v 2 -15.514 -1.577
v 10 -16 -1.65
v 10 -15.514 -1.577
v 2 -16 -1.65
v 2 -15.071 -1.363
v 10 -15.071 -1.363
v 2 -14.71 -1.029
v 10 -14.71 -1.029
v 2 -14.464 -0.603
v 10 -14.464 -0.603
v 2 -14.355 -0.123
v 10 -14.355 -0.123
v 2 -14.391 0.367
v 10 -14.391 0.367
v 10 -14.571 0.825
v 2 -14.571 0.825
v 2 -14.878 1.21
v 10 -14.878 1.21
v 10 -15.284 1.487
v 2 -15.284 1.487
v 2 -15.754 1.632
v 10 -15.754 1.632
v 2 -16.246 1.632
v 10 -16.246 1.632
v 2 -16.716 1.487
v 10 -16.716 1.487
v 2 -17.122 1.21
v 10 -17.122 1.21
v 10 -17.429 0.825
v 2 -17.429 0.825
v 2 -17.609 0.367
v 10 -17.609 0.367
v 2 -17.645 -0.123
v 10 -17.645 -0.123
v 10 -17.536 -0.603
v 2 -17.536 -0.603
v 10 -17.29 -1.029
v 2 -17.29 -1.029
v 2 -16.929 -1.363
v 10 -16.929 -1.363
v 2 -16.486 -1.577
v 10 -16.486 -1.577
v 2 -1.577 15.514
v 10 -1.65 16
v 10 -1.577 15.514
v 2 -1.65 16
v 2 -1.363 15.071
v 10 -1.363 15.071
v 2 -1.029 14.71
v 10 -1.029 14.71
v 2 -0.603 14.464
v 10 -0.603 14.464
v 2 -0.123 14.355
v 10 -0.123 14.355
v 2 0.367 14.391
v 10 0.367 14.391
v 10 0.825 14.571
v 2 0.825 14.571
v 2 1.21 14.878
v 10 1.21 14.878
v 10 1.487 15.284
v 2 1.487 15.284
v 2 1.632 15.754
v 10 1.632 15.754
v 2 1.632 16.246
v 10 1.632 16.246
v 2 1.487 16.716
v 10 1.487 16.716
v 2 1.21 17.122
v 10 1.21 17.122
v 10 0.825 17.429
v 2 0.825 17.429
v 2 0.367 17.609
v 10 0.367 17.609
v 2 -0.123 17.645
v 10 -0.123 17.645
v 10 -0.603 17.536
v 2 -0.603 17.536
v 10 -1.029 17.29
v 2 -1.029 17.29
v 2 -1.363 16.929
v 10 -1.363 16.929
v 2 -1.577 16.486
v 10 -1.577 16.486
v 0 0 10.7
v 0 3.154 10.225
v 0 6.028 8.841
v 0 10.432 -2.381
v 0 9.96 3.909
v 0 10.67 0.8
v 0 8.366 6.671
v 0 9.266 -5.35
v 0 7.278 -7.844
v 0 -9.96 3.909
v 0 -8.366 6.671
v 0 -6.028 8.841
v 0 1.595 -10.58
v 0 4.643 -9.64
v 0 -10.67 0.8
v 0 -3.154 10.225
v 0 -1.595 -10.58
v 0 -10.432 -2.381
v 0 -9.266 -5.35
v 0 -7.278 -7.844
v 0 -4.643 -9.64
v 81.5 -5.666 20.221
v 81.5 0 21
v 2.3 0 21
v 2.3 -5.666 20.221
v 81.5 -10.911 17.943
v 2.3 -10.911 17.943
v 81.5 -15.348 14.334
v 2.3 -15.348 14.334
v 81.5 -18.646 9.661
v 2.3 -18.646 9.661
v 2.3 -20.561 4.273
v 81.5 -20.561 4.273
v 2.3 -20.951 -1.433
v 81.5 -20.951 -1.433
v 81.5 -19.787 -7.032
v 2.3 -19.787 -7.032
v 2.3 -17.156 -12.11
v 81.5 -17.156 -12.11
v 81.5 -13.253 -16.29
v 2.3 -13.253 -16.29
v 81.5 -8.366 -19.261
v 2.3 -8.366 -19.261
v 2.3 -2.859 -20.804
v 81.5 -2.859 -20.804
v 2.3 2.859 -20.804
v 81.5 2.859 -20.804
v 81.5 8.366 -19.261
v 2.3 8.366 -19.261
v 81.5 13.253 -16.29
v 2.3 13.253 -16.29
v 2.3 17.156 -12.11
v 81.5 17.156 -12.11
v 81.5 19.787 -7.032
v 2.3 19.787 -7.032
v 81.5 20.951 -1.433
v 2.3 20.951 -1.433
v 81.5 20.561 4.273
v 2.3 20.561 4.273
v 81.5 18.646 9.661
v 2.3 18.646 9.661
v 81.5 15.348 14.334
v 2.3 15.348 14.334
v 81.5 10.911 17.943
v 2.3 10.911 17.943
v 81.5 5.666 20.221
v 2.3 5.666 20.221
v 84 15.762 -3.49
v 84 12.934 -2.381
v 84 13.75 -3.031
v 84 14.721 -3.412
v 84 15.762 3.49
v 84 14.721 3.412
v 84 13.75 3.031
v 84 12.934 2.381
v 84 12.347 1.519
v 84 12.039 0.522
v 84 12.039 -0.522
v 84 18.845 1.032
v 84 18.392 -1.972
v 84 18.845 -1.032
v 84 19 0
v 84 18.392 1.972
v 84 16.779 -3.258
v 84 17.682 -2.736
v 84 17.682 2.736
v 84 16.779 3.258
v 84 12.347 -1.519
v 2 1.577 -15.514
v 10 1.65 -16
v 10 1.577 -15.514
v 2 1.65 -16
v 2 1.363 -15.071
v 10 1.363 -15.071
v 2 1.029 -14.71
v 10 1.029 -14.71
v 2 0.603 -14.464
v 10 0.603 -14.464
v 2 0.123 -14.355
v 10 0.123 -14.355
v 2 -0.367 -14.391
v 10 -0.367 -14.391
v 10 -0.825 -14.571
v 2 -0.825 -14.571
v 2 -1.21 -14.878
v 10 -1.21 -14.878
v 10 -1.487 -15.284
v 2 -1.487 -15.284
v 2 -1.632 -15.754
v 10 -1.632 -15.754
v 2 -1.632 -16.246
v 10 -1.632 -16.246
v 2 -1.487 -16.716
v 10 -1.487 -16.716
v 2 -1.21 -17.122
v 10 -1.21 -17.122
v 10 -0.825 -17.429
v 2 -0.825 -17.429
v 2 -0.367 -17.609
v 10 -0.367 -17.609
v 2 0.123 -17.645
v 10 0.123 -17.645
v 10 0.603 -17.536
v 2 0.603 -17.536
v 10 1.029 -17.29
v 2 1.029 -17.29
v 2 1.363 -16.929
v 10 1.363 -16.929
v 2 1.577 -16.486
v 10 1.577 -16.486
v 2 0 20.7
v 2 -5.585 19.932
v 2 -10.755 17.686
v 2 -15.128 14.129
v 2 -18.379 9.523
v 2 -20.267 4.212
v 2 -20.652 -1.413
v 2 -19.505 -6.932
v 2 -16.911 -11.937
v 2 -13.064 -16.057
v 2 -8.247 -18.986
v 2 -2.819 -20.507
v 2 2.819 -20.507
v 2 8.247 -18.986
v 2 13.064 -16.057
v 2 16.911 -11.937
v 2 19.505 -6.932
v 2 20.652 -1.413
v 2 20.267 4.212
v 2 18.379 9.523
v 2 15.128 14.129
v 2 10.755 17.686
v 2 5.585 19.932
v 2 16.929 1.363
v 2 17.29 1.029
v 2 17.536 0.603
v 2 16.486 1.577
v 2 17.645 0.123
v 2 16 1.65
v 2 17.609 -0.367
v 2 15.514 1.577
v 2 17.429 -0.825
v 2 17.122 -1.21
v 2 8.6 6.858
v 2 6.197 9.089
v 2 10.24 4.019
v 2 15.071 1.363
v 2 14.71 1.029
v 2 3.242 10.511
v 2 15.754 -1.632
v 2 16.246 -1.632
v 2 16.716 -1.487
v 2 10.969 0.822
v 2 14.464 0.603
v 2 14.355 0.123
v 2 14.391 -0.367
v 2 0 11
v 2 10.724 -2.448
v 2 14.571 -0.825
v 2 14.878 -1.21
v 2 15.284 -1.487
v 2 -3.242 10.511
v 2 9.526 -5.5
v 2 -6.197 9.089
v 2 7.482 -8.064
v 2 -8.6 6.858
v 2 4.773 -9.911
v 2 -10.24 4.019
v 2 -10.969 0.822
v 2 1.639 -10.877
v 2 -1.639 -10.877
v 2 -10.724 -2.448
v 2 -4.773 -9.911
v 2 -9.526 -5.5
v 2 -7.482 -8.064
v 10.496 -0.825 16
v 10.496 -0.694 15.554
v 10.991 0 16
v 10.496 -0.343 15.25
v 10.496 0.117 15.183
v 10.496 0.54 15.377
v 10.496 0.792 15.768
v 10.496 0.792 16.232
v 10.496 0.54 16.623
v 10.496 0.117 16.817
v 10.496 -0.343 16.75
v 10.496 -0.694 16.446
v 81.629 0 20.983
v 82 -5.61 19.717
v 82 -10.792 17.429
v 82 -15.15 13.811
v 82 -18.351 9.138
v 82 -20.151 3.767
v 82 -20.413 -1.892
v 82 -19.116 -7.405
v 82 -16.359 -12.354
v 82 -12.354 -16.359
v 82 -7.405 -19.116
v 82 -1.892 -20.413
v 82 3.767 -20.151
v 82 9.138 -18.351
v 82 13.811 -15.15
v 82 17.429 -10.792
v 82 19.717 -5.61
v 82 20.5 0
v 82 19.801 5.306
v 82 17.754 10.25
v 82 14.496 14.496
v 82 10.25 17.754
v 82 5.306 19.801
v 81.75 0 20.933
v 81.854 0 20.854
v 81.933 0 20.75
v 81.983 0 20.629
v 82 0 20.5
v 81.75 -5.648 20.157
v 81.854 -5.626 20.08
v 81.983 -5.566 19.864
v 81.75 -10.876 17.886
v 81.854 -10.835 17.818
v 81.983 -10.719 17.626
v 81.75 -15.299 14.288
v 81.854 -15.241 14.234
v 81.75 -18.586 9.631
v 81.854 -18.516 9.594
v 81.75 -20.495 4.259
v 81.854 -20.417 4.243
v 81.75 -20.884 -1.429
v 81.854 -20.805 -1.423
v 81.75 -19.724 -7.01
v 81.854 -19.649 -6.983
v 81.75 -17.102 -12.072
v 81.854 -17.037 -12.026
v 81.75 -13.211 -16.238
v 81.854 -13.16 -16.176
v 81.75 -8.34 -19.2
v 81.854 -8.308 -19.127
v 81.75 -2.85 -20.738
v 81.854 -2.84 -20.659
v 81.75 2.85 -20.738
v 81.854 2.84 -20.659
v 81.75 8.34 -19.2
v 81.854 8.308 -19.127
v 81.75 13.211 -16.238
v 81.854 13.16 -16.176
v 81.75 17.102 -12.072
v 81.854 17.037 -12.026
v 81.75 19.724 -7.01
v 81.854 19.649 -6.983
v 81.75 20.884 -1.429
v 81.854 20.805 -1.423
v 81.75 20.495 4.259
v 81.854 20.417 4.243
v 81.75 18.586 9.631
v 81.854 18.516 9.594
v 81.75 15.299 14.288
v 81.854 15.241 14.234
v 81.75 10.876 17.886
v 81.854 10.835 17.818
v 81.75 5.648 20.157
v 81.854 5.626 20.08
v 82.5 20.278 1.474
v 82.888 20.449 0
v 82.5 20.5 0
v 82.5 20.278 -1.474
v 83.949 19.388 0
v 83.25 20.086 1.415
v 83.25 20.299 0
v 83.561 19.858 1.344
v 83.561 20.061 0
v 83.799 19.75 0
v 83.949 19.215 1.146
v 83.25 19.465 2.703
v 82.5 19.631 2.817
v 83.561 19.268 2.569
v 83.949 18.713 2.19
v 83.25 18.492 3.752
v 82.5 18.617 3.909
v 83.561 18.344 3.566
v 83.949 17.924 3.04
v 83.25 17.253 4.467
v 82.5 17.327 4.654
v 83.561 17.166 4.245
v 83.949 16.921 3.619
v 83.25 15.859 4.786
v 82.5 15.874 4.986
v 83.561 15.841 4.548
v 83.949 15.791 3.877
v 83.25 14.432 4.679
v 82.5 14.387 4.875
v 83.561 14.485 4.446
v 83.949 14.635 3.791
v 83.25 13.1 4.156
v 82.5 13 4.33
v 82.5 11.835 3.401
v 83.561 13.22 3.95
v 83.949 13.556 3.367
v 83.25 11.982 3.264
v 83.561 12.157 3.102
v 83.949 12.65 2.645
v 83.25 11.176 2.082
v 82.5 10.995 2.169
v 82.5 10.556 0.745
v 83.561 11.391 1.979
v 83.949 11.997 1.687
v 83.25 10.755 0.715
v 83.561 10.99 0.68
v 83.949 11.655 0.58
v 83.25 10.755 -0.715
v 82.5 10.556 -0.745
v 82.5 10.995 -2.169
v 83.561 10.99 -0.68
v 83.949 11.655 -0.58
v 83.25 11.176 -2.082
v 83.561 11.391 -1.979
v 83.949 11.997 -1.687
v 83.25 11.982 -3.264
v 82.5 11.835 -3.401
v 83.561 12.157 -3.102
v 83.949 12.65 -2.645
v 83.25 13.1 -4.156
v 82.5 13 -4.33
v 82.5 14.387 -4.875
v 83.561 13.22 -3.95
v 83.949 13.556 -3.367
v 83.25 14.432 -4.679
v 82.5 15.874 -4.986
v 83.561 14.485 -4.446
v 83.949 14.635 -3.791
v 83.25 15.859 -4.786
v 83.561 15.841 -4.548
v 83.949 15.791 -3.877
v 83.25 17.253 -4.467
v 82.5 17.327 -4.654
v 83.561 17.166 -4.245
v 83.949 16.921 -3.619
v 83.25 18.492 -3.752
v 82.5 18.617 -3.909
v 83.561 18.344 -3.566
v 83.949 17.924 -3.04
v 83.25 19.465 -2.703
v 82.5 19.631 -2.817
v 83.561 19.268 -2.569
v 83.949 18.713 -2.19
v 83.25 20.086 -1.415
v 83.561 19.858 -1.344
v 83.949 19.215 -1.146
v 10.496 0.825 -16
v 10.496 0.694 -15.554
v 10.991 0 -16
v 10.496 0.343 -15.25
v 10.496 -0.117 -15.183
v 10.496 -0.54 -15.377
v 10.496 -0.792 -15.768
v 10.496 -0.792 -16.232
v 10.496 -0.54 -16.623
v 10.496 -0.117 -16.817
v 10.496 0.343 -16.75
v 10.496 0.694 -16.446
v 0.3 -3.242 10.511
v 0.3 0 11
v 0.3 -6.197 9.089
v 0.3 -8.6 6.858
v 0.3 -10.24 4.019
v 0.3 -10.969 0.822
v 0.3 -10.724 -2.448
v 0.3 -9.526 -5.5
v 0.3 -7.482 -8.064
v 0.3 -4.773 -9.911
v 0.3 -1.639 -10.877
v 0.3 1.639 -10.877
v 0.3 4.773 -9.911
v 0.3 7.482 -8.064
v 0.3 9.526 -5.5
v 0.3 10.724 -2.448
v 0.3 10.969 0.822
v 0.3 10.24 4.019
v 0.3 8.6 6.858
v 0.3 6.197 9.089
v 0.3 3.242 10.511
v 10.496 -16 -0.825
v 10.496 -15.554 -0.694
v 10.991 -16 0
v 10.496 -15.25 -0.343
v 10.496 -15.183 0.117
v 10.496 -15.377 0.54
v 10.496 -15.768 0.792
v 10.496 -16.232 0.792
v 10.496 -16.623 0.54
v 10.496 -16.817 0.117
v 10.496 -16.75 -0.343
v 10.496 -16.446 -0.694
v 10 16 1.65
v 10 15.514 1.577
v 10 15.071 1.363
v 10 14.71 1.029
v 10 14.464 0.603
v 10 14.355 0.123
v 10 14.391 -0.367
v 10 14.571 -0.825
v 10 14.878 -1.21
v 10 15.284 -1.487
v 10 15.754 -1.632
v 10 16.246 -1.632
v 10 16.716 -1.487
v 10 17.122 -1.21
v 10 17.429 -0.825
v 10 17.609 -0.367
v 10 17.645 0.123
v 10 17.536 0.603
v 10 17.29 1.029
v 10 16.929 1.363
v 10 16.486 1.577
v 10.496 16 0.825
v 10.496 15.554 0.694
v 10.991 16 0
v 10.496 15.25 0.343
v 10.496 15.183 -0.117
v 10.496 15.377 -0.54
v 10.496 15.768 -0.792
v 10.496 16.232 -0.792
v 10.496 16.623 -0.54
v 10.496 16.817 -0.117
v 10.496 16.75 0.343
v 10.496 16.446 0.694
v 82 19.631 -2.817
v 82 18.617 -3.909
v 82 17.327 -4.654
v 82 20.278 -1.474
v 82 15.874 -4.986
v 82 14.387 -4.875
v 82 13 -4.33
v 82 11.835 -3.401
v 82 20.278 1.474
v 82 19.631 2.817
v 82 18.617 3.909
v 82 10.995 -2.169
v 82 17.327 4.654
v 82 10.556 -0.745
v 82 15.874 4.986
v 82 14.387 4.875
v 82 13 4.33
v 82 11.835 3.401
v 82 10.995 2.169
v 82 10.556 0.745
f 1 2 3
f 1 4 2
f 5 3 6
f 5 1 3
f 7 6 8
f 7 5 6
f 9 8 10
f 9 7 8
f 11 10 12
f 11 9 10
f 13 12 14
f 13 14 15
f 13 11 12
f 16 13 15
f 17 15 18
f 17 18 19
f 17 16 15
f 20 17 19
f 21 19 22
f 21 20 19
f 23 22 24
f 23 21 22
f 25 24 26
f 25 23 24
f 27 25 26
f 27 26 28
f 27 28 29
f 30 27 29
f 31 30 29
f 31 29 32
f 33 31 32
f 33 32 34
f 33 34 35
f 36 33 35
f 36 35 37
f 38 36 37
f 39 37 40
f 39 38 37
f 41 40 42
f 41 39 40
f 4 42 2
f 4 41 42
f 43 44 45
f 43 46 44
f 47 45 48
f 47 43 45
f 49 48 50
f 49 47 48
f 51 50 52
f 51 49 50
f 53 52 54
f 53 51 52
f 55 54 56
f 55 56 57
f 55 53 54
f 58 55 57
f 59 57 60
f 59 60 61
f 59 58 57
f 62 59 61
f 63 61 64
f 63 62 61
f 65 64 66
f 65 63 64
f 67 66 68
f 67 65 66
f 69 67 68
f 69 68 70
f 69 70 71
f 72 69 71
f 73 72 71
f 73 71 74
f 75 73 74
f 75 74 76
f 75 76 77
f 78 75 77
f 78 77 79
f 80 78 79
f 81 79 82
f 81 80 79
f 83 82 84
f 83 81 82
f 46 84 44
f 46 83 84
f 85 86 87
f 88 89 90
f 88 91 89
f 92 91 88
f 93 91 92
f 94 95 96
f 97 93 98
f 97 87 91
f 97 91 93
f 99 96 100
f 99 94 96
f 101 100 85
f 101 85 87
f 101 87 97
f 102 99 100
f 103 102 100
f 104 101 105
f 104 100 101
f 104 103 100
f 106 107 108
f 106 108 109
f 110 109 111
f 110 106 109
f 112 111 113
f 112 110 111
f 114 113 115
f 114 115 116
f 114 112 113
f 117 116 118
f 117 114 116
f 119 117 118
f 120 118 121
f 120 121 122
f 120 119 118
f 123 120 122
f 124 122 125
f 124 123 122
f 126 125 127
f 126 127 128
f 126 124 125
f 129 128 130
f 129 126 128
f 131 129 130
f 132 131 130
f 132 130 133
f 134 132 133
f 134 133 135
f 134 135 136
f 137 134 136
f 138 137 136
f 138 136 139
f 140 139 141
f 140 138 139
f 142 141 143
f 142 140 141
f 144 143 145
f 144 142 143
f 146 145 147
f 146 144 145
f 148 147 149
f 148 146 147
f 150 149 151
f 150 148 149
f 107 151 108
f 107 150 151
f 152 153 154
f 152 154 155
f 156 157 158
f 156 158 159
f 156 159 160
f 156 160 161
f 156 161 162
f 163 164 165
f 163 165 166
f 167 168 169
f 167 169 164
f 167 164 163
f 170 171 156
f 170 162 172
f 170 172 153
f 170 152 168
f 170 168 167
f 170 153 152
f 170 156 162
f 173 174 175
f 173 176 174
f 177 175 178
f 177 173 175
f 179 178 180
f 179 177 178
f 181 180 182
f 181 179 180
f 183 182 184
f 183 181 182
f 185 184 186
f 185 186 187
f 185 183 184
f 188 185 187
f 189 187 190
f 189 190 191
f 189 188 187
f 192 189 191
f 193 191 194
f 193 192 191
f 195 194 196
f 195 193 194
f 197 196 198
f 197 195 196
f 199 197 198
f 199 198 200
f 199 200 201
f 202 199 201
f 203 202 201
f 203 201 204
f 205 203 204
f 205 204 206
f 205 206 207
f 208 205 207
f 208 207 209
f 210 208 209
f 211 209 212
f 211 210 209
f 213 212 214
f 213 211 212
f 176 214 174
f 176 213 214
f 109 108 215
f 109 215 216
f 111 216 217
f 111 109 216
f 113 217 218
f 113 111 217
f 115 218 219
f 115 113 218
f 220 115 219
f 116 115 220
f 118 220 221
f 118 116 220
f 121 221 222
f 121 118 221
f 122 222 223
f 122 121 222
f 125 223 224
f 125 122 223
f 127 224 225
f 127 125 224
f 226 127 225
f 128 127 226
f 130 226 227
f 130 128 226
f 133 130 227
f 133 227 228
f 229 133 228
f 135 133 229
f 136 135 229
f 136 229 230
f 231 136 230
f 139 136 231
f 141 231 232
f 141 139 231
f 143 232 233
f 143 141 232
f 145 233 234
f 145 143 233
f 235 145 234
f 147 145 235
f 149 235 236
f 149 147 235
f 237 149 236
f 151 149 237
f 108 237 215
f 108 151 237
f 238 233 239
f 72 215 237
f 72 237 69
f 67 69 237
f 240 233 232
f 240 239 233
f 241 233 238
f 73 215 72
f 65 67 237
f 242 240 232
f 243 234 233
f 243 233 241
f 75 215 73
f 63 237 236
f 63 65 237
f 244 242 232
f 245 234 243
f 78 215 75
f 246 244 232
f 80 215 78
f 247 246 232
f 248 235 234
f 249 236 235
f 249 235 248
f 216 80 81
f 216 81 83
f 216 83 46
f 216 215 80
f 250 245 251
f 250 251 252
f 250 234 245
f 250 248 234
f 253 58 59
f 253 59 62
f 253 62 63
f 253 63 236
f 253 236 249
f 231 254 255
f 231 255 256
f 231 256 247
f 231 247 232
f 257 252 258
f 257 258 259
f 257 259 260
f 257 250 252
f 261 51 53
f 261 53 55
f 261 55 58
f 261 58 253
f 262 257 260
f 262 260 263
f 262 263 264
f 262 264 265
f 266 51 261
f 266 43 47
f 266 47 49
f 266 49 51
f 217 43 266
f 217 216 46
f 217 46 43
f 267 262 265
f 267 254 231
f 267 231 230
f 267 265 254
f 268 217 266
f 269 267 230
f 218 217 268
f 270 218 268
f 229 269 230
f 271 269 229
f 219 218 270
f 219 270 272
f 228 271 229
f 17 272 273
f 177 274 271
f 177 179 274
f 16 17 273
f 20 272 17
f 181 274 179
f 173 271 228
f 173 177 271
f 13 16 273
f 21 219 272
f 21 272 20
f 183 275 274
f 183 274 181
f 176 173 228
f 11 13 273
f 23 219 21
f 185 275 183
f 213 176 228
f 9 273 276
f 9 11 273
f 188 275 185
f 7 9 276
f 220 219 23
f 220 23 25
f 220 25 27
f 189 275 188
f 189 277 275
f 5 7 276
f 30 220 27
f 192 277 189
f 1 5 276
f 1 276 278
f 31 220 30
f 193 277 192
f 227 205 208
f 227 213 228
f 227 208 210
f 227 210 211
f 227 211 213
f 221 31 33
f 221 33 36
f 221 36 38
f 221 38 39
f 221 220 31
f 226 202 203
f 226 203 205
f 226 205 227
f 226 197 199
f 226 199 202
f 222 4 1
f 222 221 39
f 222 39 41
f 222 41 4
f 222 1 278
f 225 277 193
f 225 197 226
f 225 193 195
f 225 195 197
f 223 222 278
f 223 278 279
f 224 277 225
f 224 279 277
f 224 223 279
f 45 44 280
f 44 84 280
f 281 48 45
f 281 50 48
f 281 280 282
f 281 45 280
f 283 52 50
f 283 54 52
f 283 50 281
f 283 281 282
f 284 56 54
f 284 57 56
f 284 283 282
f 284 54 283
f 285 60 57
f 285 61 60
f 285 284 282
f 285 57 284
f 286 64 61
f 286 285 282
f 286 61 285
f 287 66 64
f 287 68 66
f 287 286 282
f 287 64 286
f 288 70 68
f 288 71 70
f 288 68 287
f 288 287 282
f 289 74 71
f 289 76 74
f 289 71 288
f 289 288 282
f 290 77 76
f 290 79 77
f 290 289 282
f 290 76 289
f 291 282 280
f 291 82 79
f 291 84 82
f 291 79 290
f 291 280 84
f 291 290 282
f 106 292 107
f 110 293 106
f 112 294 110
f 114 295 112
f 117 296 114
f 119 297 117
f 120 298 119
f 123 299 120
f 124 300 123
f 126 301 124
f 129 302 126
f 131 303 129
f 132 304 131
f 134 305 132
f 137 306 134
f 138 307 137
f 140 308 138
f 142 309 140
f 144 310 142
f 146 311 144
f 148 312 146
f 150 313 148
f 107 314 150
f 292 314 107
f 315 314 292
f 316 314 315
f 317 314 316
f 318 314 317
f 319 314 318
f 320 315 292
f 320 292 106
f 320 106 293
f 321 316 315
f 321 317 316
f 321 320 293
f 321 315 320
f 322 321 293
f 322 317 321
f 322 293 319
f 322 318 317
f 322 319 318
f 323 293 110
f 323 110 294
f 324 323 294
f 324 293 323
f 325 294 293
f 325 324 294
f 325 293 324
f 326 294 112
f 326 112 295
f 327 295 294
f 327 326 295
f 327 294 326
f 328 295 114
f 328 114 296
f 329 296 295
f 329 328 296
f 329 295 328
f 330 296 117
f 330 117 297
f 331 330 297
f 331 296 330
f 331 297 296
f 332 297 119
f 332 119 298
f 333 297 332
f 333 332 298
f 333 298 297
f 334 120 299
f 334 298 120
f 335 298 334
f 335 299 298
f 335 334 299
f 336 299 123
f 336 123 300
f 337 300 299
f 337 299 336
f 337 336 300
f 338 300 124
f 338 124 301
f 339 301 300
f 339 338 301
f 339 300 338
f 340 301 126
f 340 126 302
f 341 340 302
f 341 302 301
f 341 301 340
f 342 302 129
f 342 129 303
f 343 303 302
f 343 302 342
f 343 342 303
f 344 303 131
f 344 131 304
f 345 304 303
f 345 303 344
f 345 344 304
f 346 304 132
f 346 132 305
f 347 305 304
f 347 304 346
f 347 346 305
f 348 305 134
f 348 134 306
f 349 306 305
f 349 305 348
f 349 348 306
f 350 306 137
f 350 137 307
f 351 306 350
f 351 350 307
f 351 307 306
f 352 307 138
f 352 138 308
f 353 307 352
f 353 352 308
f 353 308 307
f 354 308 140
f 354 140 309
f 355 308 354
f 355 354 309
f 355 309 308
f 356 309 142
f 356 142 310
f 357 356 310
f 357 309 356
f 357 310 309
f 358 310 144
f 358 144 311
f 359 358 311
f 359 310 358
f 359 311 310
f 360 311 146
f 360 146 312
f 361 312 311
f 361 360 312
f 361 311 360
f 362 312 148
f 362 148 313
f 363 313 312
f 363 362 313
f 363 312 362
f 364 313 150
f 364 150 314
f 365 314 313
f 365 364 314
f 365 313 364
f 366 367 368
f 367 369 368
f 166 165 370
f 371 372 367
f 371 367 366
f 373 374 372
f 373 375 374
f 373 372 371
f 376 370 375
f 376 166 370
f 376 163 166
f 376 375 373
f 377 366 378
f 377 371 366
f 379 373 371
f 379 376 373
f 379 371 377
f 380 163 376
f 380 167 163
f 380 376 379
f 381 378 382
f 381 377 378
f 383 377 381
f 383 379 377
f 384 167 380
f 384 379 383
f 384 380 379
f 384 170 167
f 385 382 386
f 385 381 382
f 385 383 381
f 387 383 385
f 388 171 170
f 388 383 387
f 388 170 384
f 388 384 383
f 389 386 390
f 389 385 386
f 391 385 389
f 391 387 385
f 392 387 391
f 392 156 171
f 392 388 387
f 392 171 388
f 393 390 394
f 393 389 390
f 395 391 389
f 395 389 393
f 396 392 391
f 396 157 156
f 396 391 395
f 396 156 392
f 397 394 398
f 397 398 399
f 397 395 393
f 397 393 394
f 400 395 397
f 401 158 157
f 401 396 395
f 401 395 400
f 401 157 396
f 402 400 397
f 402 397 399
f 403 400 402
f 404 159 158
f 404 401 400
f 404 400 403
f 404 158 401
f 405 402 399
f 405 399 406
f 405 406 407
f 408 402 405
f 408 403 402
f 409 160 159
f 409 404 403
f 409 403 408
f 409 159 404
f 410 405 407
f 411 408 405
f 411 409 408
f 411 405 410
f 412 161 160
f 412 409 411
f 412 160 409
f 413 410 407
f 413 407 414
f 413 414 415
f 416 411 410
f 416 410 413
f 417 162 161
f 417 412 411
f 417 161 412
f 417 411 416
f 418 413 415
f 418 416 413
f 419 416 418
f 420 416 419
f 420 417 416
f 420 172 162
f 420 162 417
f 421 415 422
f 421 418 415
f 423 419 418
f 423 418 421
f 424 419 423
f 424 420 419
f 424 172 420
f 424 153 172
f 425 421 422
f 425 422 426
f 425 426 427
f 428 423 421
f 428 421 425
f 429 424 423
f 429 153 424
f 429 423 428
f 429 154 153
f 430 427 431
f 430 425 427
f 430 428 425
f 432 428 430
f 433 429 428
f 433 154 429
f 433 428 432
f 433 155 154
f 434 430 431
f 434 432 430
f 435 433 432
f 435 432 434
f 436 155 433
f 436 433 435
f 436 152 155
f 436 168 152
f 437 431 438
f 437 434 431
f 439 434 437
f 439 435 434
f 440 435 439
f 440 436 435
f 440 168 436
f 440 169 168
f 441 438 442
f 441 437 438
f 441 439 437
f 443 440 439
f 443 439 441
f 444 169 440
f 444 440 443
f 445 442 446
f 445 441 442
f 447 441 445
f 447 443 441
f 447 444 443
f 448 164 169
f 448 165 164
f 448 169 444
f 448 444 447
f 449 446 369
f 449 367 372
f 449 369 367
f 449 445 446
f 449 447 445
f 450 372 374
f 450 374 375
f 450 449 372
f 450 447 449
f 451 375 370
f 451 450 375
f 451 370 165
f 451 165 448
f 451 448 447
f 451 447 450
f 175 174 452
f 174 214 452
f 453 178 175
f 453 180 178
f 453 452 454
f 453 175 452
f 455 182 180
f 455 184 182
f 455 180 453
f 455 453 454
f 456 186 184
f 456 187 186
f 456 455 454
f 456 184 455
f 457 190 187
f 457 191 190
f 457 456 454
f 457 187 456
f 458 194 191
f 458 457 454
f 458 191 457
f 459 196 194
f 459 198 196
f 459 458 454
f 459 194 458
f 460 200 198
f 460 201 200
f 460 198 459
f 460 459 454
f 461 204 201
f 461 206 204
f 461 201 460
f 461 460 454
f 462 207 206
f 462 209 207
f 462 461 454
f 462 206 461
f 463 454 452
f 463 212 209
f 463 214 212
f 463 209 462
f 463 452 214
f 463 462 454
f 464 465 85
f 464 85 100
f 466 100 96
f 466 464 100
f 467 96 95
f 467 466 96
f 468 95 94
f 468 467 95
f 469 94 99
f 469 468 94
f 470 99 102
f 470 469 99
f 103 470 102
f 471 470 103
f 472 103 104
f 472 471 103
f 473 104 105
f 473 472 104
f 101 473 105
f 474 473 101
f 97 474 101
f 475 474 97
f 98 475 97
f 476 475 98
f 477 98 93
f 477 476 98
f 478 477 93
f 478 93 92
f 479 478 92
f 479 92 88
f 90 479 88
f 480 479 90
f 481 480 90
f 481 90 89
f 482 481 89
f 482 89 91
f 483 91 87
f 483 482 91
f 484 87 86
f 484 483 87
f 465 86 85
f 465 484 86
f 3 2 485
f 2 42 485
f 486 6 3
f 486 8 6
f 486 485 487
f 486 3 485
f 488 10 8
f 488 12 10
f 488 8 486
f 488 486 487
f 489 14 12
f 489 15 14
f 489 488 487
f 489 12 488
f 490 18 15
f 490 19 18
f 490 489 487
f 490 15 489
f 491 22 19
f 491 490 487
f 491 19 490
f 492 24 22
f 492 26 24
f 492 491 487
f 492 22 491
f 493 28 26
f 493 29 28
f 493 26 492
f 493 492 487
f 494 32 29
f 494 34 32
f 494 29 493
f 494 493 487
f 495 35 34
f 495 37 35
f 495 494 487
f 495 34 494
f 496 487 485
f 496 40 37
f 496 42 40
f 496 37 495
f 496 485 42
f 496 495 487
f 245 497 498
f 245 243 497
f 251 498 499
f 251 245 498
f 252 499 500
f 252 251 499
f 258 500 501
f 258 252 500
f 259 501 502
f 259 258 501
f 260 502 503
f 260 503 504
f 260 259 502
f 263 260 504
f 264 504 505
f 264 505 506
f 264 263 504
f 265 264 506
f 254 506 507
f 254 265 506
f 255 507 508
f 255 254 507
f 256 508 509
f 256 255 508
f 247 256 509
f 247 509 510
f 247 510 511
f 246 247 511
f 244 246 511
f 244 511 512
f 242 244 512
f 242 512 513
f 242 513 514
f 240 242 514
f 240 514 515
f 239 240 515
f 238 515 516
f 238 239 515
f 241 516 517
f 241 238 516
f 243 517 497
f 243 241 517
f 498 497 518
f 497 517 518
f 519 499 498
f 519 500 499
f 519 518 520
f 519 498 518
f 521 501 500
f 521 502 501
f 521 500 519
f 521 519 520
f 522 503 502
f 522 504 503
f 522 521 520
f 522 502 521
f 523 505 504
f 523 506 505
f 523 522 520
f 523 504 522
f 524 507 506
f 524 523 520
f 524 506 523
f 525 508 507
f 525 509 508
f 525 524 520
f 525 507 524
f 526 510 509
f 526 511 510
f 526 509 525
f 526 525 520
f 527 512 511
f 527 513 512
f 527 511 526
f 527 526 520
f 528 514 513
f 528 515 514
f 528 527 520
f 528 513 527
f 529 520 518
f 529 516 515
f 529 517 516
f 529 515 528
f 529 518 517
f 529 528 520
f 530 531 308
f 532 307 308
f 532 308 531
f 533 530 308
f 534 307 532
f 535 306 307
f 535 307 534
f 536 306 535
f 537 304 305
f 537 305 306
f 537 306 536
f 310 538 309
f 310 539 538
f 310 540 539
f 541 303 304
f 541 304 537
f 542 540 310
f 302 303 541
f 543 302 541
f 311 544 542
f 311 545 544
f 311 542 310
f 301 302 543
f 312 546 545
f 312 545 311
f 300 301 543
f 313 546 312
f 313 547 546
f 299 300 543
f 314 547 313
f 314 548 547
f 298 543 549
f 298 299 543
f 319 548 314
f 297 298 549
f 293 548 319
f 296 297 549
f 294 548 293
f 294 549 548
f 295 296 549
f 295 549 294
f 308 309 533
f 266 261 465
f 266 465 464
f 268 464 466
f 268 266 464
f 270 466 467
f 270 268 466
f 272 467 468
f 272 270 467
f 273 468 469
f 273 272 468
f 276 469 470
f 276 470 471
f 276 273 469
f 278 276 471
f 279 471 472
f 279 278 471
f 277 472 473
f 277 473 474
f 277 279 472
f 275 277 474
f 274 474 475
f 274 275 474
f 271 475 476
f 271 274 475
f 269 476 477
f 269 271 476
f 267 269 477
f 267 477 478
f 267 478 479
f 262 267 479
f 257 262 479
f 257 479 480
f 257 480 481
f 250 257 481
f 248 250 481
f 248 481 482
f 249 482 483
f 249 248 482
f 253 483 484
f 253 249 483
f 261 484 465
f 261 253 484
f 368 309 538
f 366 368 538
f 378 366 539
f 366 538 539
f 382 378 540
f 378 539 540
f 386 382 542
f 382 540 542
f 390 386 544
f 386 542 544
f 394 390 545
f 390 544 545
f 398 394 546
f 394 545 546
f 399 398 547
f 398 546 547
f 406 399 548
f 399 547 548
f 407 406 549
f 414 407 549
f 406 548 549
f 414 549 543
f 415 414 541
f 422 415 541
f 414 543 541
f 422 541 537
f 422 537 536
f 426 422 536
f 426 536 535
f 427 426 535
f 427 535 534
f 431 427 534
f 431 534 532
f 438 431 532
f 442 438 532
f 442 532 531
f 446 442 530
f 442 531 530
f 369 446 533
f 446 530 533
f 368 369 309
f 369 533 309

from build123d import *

# Parameters (mm, degrees)
CHANFREIN1_SIZE              = 0.3
CONG_1_R                     = 0.5
ESQUISSE2_R                  = 5
BOSS_EXTRU_1_DEPTH           = 2
CONG_2_R                     = 1.5
R_P_TITION_CIRCULAIRE1_COUNT = 4


with BuildPart() as part:
    # Esquisse1 → Révolution1 (revolve)
    with BuildSketch(Plane.XY):
        Polygon((0, 0), (0, 11), (2, 11), (2, 21), (82, 21), (82, 0), align=None)
    revolve(axis=Axis((-33.755102041, 0, 0), (1, 0, 0)))

    # Chanfrein1
    chanfrein1_edges = [part.edges().sort_by_distance(p)[0] for p in [
        (0, -11, 0),
        (2, -21, 0),
    ]]
    chamfer(chanfrein1_edges, length=CHANFREIN1_SIZE)

    # Congé1
    cong_1_edges = [part.edges().sort_by_distance(p)[0] for p in [
        (82, -21, 0),
    ]]
    fillet(cong_1_edges, radius=CONG_1_R)

    # Esquisse2 → Boss.-Extru.1 (add)
    with BuildSketch(Plane(origin=(82, 0, 0), x_dir=(0, 0, -1), z_dir=(1, 0, 0))):
        with Locations((0, 15.5)):
            Circle(ESQUISSE2_R)
    extrude(amount=BOSS_EXTRU_1_DEPTH)

    # Congé2
    cong_2_edges = [part.edges().sort_by_distance(p)[0] for p in [
        (84, 15.5, 5),
    ]]
    fillet(cong_2_edges, radius=CONG_2_R)

    # Esquisse4 → Trou pour taraudage pour trou taraudé M41 (revolve, cut)
    with BuildSketch(Plane(origin=(2, 16, 0), x_dir=(0, 0, 1), z_dir=(0, 1, 0))):
        Polygon((0, 0), (0, 8.991420021), (1.65, 8), (1.65, 0), align=None)
    trou_pour_taraudage_pour_trou_taraud_m4 = revolve(axis=Axis((-4.35, 16, 0), (1, 0, 0)), mode=Mode.SUBTRACT)

    # Répétition circulaire1: Trou pour taraudage pour trou taraudé M41 ×4 about axis
    r_p_tition_circulaire1_axis = Axis((2, 0, 0), (-1, 0, 0))
    for i in range(1, R_P_TITION_CIRCULAIRE1_COUNT):
        add(trou_pour_taraudage_pour_trou_taraud_m4.rotate(r_p_tition_circulaire1_axis, i * 360 / R_P_TITION_CIRCULAIRE1_COUNT), mode=Mode.SUBTRACT)


solid = part.part
